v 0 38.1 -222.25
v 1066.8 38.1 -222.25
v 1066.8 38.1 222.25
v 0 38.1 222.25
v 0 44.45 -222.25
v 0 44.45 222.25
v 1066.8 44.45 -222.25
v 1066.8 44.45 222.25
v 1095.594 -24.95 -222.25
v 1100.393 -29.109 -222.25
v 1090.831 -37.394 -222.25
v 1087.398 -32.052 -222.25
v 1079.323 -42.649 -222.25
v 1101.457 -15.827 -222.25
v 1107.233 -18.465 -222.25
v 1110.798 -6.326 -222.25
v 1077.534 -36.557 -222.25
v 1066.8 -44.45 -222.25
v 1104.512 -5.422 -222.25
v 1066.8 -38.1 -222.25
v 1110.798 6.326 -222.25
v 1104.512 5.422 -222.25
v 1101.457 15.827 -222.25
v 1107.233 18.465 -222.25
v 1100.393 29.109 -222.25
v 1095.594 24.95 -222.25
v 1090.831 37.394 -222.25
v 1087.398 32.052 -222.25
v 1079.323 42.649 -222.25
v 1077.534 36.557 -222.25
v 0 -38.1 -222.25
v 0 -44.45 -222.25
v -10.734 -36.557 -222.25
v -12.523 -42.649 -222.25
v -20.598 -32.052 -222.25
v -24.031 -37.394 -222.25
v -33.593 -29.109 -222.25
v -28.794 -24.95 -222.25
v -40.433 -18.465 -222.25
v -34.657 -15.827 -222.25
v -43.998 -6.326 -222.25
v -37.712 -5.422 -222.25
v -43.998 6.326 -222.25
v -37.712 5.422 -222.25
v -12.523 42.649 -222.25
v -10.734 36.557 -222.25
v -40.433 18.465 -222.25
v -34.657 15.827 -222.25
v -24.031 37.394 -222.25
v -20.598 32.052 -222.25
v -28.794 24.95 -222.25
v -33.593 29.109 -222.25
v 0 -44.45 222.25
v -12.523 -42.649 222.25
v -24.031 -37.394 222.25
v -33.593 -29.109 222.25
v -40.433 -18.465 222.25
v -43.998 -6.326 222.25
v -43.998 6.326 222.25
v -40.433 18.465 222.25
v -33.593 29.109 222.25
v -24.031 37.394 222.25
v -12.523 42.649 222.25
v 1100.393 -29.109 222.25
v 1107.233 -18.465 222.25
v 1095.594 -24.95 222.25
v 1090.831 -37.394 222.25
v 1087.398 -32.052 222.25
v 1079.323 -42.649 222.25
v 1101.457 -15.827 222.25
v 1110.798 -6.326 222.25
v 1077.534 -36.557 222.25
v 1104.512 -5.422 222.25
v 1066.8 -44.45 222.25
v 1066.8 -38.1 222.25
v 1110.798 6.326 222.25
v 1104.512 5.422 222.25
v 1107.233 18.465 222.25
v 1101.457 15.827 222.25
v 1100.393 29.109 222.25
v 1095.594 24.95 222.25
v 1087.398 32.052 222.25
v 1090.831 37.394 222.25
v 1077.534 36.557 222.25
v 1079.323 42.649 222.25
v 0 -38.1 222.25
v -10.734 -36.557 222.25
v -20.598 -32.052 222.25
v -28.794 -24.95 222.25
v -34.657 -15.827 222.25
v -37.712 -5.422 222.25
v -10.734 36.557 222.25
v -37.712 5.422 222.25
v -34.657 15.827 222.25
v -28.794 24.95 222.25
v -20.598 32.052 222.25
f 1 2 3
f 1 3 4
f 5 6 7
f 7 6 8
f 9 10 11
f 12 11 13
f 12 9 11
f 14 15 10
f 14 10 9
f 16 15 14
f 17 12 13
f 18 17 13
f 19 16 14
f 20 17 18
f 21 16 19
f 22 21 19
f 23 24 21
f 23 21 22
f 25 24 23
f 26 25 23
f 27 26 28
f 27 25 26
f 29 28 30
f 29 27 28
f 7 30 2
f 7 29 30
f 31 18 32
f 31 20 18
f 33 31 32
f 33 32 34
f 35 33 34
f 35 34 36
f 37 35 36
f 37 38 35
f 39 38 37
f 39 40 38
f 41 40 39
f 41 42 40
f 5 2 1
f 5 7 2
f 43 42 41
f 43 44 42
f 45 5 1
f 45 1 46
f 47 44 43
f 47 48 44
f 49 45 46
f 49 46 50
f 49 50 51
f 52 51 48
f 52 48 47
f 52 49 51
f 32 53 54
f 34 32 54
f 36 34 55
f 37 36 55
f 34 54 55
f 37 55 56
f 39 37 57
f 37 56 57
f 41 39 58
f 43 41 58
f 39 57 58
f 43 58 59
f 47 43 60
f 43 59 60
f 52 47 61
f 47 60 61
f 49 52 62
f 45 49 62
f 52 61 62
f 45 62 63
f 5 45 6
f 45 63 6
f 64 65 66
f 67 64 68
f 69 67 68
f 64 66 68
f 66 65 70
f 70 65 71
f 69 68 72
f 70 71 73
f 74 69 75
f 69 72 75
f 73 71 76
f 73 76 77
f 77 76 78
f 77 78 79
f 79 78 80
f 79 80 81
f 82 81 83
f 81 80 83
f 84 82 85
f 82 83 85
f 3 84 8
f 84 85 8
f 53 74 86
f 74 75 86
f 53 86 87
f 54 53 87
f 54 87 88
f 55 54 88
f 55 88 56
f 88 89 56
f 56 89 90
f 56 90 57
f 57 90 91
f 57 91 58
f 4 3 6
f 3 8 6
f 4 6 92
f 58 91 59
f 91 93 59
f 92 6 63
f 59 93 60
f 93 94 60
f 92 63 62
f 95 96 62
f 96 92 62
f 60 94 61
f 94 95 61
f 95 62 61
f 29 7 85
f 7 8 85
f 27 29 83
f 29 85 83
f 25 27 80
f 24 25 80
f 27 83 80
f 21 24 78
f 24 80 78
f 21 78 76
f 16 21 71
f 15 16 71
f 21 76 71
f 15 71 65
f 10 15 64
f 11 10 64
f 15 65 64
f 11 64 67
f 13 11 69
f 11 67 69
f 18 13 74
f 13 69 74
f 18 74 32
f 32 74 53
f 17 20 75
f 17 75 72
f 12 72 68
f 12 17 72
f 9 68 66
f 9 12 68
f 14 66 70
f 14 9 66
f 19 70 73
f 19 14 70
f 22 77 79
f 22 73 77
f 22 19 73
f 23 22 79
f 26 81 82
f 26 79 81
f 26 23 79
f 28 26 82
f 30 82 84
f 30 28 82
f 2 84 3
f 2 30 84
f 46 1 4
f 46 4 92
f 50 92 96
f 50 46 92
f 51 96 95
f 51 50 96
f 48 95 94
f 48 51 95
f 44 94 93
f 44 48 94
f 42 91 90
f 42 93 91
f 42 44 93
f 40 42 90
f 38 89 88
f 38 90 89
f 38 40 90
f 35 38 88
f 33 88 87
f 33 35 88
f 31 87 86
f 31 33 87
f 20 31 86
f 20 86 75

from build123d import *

# Parameters (mm, degrees)
BOSS_EXTRUDE1_DEPTH     = 222.25
CUT_EXTRUDE1_DEPTH      = 1
CUT_EXTRUDE1_DEPTH_BACK = 445.5


with BuildPart() as part:
    # Sketch1 → Boss-Extrude1 (new body, symmetric)
    with BuildSketch(Plane.XY):
        with BuildLine():
            Line((0, 44.45), (1066.8, 44.45))
            ThreePointArc((1066.8, 44.45), (1111.25, 0), (1066.8, -44.45))
            Line((1066.8, -44.45), (0, -44.45))
            ThreePointArc((0, -44.45), (-44.45, 0), (0, 44.45))
        make_face()
    extrude(amount=BOSS_EXTRUDE1_DEPTH, both=True)

    # Sketch2 → Cut-Extrude1 (cut, two sides)
    with BuildSketch(Plane(origin=(0, 0, -222.25), x_dir=(-1, 0, 0), z_dir=(0, 0, -1))) as cut_extrude1_sk:
        with BuildLine():
            Line((-1066.8, 38.1), (0, 38.1))
            ThreePointArc((0, 38.1), (38.1, 0), (0, -38.1))
            Line((0, -38.1), (-1066.8, -38.1))
            ThreePointArc((-1066.8, -38.1), (-1104.9, 0), (-1066.8, 38.1))
        make_face()
    extrude(amount=CUT_EXTRUDE1_DEPTH, mode=Mode.SUBTRACT)
    extrude(cut_extrude1_sk.sketch, amount=-CUT_EXTRUDE1_DEPTH_BACK, mode=Mode.SUBTRACT)


solid = part.part
